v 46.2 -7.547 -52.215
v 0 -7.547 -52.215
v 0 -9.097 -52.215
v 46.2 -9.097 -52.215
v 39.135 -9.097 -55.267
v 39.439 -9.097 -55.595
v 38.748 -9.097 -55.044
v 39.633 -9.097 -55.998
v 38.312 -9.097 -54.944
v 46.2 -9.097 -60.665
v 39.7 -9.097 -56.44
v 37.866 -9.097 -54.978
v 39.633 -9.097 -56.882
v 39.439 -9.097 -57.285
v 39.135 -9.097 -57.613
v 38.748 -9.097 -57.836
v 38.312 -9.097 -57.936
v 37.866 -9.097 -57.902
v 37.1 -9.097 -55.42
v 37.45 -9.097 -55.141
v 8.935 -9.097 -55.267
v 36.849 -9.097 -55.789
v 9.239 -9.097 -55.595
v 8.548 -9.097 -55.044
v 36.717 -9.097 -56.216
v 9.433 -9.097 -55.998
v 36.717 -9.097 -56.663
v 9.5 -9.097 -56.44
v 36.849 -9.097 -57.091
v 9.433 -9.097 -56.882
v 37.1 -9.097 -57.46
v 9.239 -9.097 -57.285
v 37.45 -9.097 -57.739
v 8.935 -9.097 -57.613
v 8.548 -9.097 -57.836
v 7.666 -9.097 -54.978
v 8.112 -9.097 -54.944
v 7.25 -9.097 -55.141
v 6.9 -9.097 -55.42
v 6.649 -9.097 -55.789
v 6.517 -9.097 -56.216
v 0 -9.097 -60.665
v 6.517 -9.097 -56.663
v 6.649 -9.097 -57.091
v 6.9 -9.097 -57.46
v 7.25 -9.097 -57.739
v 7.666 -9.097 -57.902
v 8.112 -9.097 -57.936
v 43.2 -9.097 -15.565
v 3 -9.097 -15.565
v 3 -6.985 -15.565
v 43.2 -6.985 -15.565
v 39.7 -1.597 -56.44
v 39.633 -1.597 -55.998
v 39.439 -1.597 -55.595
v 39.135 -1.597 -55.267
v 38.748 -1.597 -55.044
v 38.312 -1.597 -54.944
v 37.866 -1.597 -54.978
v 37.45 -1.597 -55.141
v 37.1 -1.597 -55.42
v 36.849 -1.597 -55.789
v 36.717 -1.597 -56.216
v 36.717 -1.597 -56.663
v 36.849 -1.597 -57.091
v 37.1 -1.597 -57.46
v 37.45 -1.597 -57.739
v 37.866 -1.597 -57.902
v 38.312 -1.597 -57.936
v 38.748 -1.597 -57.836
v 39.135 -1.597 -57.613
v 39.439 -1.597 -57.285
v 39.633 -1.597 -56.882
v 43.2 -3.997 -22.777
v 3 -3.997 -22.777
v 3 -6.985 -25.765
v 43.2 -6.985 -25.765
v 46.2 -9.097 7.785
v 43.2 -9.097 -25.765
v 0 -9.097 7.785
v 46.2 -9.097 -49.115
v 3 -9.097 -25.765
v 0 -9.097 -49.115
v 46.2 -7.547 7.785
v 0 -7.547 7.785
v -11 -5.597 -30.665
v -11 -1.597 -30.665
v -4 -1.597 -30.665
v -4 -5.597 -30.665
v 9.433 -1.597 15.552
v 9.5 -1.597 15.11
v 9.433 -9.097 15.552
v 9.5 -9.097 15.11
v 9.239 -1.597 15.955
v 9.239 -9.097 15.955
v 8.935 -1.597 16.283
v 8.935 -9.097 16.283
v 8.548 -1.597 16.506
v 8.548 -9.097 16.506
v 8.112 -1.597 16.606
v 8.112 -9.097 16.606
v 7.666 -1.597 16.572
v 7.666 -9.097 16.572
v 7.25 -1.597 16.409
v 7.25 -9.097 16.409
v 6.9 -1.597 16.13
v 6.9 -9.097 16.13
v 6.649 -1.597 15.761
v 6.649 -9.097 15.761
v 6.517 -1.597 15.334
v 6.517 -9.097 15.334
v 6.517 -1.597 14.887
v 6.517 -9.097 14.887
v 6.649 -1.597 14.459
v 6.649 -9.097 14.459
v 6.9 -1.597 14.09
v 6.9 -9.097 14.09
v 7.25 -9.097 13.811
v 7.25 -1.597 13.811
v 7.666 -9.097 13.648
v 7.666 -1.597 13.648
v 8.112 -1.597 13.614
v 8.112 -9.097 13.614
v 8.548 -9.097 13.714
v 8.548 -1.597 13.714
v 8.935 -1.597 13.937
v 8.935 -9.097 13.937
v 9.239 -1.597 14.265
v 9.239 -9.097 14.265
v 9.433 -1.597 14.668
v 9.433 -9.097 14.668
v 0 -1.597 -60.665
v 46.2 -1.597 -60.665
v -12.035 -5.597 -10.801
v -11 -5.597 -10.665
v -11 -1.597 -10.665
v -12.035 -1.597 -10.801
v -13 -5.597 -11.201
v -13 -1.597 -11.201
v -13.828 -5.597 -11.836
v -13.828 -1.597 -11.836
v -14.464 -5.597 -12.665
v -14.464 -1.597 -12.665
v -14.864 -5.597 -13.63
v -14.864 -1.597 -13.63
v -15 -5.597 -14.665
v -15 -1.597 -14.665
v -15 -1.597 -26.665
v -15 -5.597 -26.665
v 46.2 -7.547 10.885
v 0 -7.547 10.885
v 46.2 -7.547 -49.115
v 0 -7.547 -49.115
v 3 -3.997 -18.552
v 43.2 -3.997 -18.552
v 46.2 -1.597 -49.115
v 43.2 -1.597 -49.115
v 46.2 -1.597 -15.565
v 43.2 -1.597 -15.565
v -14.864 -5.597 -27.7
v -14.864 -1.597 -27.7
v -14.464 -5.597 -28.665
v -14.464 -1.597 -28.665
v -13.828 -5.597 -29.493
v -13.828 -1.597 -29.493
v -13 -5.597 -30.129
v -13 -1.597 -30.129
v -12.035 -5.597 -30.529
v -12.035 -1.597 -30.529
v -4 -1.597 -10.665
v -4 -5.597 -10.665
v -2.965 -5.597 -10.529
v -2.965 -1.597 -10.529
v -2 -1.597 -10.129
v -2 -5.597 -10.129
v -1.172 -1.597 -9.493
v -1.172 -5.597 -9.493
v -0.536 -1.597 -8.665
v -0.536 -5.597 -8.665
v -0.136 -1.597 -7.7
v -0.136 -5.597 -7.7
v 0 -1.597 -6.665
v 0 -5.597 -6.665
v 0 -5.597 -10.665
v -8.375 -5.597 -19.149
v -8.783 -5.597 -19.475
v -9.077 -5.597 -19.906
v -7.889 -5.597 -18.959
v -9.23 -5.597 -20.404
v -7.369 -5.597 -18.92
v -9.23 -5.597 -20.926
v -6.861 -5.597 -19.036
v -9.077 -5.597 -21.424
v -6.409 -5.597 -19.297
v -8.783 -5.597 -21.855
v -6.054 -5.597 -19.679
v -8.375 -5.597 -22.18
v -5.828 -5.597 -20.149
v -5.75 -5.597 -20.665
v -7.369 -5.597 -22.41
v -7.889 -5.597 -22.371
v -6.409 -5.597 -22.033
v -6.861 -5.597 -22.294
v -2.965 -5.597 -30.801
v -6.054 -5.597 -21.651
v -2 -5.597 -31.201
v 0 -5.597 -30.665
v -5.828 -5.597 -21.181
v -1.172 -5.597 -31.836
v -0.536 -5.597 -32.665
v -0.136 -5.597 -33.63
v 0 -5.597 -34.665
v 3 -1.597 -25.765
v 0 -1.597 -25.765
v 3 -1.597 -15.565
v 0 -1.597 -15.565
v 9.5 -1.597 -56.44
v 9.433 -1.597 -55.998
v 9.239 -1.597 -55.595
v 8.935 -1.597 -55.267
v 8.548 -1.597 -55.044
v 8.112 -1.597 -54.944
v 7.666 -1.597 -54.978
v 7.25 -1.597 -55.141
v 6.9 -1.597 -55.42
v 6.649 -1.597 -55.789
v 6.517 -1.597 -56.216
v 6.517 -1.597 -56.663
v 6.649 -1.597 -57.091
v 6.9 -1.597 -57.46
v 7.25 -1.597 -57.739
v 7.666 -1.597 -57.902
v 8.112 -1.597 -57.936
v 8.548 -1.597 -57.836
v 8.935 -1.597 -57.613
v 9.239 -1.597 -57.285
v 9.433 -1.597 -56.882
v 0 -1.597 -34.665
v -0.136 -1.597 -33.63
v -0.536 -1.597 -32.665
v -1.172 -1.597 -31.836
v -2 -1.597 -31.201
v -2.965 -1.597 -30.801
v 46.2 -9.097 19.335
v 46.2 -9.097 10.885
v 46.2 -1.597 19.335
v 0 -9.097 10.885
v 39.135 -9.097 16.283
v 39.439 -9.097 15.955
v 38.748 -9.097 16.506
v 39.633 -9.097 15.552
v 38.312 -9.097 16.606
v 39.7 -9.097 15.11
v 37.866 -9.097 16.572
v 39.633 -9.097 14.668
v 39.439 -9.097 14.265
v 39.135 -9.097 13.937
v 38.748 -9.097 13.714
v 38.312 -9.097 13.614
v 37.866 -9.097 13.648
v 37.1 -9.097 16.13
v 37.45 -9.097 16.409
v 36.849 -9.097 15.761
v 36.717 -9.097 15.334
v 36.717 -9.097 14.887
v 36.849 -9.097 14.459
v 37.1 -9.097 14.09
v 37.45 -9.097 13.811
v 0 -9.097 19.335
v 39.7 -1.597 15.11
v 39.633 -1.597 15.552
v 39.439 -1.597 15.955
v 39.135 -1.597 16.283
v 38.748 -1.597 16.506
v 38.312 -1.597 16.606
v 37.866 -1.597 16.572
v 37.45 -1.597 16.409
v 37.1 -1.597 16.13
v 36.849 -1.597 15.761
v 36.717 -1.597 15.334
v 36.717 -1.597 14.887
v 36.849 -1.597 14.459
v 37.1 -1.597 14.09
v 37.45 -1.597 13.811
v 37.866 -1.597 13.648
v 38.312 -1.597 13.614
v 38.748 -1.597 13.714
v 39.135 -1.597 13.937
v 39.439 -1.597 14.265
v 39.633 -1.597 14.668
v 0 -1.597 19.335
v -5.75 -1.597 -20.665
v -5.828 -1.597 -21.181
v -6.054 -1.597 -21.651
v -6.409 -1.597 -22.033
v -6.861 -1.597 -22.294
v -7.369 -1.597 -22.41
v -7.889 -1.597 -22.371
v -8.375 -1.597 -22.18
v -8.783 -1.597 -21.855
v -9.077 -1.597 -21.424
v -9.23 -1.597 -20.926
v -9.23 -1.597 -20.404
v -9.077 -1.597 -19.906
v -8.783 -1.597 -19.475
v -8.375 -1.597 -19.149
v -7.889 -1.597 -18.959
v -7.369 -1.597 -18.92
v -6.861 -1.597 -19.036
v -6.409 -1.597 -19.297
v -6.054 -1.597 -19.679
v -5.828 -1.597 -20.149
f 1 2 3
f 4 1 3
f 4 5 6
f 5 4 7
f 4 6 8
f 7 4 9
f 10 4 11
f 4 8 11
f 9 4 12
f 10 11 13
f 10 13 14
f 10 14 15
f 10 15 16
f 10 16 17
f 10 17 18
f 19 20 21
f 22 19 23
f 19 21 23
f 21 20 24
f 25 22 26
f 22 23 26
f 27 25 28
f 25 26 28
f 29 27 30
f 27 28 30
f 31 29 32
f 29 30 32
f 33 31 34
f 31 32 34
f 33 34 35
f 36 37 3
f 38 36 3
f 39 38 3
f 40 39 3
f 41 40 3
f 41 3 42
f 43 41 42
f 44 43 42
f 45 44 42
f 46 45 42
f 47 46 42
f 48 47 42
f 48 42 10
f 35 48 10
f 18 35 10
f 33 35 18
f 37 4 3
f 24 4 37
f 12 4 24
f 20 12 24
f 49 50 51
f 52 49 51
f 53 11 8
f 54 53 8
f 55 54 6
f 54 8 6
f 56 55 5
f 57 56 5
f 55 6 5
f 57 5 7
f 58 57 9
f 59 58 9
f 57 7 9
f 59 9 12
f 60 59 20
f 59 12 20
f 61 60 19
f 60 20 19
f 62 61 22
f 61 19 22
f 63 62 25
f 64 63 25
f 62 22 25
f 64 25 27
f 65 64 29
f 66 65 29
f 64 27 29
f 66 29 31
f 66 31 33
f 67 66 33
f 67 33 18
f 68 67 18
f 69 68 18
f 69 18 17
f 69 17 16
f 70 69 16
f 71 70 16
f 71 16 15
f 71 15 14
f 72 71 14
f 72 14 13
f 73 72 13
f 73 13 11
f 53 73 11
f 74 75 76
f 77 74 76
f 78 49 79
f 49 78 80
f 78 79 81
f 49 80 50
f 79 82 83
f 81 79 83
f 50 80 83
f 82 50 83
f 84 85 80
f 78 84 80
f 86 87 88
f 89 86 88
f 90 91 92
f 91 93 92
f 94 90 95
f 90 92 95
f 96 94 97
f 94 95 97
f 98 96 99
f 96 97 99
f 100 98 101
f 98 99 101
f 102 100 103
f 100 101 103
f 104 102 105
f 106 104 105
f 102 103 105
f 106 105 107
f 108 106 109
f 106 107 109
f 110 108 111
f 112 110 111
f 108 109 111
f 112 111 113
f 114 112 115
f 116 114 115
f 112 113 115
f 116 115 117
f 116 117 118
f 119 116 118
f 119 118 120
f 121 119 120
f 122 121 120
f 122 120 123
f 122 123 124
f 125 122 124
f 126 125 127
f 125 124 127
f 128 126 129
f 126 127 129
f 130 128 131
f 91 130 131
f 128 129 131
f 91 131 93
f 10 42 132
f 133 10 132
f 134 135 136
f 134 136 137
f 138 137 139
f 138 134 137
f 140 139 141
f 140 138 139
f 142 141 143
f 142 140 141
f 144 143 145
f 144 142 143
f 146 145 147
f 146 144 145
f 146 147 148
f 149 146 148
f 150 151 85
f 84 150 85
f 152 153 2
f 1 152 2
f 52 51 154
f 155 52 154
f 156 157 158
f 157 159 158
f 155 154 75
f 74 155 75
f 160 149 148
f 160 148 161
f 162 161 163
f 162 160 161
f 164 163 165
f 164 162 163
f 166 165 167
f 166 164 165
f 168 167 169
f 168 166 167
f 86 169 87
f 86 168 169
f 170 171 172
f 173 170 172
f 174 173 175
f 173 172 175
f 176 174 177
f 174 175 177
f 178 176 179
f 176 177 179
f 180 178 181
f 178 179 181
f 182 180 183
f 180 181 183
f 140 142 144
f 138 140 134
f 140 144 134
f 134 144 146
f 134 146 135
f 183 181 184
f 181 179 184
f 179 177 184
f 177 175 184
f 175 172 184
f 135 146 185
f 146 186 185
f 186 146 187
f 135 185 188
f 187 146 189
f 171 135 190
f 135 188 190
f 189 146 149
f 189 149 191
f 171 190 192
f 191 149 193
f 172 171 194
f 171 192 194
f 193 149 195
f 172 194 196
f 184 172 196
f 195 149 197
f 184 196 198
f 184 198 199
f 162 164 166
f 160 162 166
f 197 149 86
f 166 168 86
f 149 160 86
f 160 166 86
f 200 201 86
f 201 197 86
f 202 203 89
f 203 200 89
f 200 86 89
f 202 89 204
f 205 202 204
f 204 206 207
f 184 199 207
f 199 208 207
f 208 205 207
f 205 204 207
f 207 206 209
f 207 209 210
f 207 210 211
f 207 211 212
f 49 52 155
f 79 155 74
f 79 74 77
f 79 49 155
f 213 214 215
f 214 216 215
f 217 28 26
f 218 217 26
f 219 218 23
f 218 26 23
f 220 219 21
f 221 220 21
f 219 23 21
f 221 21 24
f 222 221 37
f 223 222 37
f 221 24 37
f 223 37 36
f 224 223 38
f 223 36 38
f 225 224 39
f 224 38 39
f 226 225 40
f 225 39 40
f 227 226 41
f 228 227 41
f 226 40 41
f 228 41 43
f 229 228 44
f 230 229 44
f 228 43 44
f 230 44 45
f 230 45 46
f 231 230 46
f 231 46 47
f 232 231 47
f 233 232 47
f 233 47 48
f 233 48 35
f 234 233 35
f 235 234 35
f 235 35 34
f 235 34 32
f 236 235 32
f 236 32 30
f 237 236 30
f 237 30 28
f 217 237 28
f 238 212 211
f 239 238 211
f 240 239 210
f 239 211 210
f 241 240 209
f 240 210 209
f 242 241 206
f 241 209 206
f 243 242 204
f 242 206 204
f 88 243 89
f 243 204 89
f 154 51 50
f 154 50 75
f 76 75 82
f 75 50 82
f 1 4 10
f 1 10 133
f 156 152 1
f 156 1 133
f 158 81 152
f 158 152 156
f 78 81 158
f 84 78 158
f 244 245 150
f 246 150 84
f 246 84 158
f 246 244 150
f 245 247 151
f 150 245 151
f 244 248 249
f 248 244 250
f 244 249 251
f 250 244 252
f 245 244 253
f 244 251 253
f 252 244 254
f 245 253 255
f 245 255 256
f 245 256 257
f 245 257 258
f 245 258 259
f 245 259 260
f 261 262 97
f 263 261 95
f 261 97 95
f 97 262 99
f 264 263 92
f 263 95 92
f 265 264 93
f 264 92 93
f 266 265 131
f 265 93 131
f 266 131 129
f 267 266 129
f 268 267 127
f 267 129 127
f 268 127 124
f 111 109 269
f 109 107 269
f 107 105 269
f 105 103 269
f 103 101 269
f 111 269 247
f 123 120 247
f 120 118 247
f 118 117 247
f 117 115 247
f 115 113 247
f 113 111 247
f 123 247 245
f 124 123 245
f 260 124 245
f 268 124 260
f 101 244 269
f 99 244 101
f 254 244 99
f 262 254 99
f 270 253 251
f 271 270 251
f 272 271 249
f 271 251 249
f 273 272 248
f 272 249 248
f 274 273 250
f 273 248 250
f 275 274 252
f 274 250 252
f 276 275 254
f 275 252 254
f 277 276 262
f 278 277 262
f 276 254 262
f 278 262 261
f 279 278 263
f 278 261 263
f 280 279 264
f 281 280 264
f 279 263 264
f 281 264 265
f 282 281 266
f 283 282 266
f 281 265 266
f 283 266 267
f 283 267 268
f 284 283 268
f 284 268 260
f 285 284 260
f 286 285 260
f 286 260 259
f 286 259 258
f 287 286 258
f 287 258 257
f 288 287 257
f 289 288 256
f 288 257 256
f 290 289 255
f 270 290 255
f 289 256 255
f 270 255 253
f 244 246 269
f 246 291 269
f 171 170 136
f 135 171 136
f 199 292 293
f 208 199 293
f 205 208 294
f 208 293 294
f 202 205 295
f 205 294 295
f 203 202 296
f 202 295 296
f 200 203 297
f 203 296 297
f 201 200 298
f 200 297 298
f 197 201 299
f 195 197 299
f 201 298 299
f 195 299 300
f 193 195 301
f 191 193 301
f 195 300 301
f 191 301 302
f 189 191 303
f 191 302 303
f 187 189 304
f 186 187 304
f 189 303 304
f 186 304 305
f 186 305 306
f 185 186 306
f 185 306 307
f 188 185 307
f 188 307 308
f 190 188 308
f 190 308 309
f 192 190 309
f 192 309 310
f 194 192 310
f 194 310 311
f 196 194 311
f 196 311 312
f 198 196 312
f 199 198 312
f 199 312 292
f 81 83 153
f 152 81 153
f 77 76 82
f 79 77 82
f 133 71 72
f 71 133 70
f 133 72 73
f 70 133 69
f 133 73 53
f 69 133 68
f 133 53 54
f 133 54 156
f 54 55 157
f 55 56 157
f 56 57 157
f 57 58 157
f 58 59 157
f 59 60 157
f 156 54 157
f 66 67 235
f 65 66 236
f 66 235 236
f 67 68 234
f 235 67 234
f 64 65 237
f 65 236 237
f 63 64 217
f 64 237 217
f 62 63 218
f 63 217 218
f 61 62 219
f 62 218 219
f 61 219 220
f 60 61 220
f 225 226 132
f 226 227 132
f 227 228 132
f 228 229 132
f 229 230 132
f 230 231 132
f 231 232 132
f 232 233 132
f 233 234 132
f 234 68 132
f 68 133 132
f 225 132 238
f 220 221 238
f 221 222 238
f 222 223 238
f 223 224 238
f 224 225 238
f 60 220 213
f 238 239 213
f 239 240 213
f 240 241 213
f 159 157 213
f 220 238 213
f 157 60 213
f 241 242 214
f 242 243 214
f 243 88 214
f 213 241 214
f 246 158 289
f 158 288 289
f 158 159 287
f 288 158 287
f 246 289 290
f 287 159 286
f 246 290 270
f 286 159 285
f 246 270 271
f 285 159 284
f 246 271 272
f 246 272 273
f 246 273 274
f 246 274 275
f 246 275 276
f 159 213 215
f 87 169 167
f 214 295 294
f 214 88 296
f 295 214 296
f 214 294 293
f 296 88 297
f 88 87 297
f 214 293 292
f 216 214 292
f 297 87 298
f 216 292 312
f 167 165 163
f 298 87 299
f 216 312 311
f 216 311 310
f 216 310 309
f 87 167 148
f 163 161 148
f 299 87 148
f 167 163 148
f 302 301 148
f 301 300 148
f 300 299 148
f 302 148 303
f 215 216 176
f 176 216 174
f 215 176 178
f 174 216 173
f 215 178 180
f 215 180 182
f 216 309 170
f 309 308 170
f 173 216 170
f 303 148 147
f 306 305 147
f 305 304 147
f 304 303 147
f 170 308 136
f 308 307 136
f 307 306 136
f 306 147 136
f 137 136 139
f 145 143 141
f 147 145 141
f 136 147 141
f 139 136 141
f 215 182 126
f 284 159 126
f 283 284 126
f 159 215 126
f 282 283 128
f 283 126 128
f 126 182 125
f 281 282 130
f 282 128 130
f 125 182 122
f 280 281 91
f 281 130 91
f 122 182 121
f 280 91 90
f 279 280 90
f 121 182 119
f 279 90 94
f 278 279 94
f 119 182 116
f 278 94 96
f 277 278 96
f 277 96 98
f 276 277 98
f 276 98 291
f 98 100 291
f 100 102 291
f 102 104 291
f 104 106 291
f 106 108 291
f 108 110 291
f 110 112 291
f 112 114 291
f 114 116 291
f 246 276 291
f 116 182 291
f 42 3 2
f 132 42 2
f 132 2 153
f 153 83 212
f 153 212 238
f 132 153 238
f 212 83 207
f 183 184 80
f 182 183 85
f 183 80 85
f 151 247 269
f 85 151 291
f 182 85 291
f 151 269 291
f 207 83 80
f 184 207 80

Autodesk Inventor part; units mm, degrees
ref_plane "YZ Plane" through (0, 0, 0) normal (1, 0, 0) x (0, 1, 0)
ref_plane "XZ Plane" through (0, 0, 0) normal (0, 1, 0) x (-1, 0, 0)
sketch "Sketch1" plane through (0, 0, 0) normal (1, 0, 0) x (0, 1, 0)
  line L0 (-1.5973, 19.3351) -> (-9.0973, 19.3351)
  line L1 (-9.0973, -60.6649) -> (-1.5973, -60.6649)
  line L2 (-1.5973, -60.6649) -> (-1.5973, 19.3351)
  line L3 (20.1932, -20.6649) -> (-21.0203, -20.6649)
  line L4 (-9.0973, 19.3351) -> (-9.0973, -15.5649)
  line L5 (-9.0973, -25.7649) -> (-9.0973, -60.6649)
  circle A0 centre (-9.0973, -20.6649) radius 5.1 construction
  line L6 (-11.2098, -15.5649) -> (-6.9848, -15.5649)
  line L7 (-6.9848, -15.5649) -> (-3.9973, -18.5524)
  line L8 (-3.9973, -18.5524) -> (-3.9973, -22.7774)
  line L9 (-3.9973, -22.7774) -> (-6.9848, -25.7649)
  line L10 (-6.9848, -25.7649) -> (-11.2098, -25.7649)
  line L11 (-10.6473, 10.8851) -> (-7.5473, 10.8851)
  line L12 (-7.5473, 10.8851) -> (-7.5473, 7.7851)
  line L13 (-7.5473, 7.7851) -> (-10.6473, 7.7851)
  line L14 (-10.6473, 7.7851) -> (-10.6473, 10.8851)
  line L15 (-10.6473, 10.8851) -> (-7.5473, 7.7851) construction
  line L16 (-7.5473, 10.8851) -> (-10.6473, 7.7851) construction
  point P0 (0, 0)
  point P1 (-9.0973, 9.3351)
  dimension "d6" = 10.2
  dimension "d2" = 7.5
  dimension "d3" = 80
  dimension "d7" = 3.1
  dimension "d9" = 60
extrude "Extrusion1" add sketch "Sketch1" along normal blind 46.2 contours L2 L3 L8 L7 L6 L4 L13 L12 L11 L0 | L2 L1 L5 L10 L9 L8 L3 | L11 L12 L13 L4
extrude "Extrusion2" cut sketch "Sketch1" along normal through all contours L11 L12 L13 L4 | L4 L13 L14 L11
ref_plane "Work Plane1" through (0, -1.5973, -20.6649) normal (0, 0, 1) x (1, 0, 0)
mirror "Mirror1" about plane through (0, -1.5973, -20.6649) normal (0, 0, 1) of "Extrusion2"
sketch "Sketch2" plane through (0, -9.0973, 19.3351) normal (0, -1, 0) x (1, 0, 0)
  line L0 (0, 0) -> (0, -8.45) projected
  line L1 (0, -4.225) -> (55.9081, -4.225)
  line L2 (0, 0) -> (46.2, 0) projected
  line L3 (23.1, 0) -> (23.1, -31.5844)
  line L4 (8, 4.0283) -> (8, -8.7646)
  circle A0 centre (8, -4.225) radius 1.5
  circle A1 centre (38.2, -4.225) radius 1.5
  point P0 (0, -19.3351)
  dimension "d12" = 8
  dimension "d13" = 3
extrude "Extrusion3" cut sketch "Sketch2" against normal through all contours A1 L1 | L1 A1 | A0 L4 L1 | L1 L4 A0 | A0 L1 L4 | L1 A0 L4
mirror "Mirror2" about plane through (0, -1.5973, -20.6649) normal (0, 0, 1) of "Extrusion3"
sketch "Sketch3" plane through (0, -9.0973, 19.3351) normal (0, -1, 0) x (1, 0, 0)
  line L0 (0, -68.45) -> (46.2, -68.45) projected
  line L1 (46.2, -34.9) -> (43.2, -34.9)
  line L2 (43.2, -34.9) -> (43.2, -68.45)
  line L3 (43.2, -68.45) -> (46.2, -68.45)
  line L4 (46.2, -68.45) -> (46.2, -34.9)
  line L5 (0, -34.9) -> (3, -34.9)
  line L6 (3, -34.9) -> (3, -45.1)
  line L7 (3, -45.1) -> (0, -45.1)
  line L8 (0, -45.1) -> (0, -34.9)
  point P0 (0, -19.3351)
  dimension "d16" = 3
  dimension "d17" = 3
extrude "Extrusion4" add sketch "Sketch3" against normal through all
sketch "Sketch4" plane through (0, -1.5973, -60.6649) normal (0, 1, 0) x (1, 0, 0)
  line L0 (0, -50) -> (-15, -50)
  line L1 (-15, -50) -> (-15, -30)
  line L2 (-15, -30) -> (0, -30)
  line L3 (0, -30) -> (0, -50)
  line L4 (58.44, -40) -> (-27.24, -40) projected
  line L5 (0, 0) -> (0, -80) construction
  circle A0 centre (-7.5, -40) radius 1.75
  point P0 (0, -60.6649)
  dimension "d20" = 15
  dimension "d21" = 20
  dimension "d22" = 3.5
  dimension "d23" = 7.5
extrude "Extrusion5" add sketch "Sketch4" against normal blind 4 contours L0 L1 L4 A0 L3 | L4 A0 L1 L2 L3
fillet "Fillet1" radius 4 4 edges at (0, -3.5973, -10.6649) (-15, -3.5973, -10.6649) (-15, -3.5973, -30.6649) (0, -3.5973, -30.6649)
equation "\"d17\" = d16"
properties part number "PRING_piston_case_half"
